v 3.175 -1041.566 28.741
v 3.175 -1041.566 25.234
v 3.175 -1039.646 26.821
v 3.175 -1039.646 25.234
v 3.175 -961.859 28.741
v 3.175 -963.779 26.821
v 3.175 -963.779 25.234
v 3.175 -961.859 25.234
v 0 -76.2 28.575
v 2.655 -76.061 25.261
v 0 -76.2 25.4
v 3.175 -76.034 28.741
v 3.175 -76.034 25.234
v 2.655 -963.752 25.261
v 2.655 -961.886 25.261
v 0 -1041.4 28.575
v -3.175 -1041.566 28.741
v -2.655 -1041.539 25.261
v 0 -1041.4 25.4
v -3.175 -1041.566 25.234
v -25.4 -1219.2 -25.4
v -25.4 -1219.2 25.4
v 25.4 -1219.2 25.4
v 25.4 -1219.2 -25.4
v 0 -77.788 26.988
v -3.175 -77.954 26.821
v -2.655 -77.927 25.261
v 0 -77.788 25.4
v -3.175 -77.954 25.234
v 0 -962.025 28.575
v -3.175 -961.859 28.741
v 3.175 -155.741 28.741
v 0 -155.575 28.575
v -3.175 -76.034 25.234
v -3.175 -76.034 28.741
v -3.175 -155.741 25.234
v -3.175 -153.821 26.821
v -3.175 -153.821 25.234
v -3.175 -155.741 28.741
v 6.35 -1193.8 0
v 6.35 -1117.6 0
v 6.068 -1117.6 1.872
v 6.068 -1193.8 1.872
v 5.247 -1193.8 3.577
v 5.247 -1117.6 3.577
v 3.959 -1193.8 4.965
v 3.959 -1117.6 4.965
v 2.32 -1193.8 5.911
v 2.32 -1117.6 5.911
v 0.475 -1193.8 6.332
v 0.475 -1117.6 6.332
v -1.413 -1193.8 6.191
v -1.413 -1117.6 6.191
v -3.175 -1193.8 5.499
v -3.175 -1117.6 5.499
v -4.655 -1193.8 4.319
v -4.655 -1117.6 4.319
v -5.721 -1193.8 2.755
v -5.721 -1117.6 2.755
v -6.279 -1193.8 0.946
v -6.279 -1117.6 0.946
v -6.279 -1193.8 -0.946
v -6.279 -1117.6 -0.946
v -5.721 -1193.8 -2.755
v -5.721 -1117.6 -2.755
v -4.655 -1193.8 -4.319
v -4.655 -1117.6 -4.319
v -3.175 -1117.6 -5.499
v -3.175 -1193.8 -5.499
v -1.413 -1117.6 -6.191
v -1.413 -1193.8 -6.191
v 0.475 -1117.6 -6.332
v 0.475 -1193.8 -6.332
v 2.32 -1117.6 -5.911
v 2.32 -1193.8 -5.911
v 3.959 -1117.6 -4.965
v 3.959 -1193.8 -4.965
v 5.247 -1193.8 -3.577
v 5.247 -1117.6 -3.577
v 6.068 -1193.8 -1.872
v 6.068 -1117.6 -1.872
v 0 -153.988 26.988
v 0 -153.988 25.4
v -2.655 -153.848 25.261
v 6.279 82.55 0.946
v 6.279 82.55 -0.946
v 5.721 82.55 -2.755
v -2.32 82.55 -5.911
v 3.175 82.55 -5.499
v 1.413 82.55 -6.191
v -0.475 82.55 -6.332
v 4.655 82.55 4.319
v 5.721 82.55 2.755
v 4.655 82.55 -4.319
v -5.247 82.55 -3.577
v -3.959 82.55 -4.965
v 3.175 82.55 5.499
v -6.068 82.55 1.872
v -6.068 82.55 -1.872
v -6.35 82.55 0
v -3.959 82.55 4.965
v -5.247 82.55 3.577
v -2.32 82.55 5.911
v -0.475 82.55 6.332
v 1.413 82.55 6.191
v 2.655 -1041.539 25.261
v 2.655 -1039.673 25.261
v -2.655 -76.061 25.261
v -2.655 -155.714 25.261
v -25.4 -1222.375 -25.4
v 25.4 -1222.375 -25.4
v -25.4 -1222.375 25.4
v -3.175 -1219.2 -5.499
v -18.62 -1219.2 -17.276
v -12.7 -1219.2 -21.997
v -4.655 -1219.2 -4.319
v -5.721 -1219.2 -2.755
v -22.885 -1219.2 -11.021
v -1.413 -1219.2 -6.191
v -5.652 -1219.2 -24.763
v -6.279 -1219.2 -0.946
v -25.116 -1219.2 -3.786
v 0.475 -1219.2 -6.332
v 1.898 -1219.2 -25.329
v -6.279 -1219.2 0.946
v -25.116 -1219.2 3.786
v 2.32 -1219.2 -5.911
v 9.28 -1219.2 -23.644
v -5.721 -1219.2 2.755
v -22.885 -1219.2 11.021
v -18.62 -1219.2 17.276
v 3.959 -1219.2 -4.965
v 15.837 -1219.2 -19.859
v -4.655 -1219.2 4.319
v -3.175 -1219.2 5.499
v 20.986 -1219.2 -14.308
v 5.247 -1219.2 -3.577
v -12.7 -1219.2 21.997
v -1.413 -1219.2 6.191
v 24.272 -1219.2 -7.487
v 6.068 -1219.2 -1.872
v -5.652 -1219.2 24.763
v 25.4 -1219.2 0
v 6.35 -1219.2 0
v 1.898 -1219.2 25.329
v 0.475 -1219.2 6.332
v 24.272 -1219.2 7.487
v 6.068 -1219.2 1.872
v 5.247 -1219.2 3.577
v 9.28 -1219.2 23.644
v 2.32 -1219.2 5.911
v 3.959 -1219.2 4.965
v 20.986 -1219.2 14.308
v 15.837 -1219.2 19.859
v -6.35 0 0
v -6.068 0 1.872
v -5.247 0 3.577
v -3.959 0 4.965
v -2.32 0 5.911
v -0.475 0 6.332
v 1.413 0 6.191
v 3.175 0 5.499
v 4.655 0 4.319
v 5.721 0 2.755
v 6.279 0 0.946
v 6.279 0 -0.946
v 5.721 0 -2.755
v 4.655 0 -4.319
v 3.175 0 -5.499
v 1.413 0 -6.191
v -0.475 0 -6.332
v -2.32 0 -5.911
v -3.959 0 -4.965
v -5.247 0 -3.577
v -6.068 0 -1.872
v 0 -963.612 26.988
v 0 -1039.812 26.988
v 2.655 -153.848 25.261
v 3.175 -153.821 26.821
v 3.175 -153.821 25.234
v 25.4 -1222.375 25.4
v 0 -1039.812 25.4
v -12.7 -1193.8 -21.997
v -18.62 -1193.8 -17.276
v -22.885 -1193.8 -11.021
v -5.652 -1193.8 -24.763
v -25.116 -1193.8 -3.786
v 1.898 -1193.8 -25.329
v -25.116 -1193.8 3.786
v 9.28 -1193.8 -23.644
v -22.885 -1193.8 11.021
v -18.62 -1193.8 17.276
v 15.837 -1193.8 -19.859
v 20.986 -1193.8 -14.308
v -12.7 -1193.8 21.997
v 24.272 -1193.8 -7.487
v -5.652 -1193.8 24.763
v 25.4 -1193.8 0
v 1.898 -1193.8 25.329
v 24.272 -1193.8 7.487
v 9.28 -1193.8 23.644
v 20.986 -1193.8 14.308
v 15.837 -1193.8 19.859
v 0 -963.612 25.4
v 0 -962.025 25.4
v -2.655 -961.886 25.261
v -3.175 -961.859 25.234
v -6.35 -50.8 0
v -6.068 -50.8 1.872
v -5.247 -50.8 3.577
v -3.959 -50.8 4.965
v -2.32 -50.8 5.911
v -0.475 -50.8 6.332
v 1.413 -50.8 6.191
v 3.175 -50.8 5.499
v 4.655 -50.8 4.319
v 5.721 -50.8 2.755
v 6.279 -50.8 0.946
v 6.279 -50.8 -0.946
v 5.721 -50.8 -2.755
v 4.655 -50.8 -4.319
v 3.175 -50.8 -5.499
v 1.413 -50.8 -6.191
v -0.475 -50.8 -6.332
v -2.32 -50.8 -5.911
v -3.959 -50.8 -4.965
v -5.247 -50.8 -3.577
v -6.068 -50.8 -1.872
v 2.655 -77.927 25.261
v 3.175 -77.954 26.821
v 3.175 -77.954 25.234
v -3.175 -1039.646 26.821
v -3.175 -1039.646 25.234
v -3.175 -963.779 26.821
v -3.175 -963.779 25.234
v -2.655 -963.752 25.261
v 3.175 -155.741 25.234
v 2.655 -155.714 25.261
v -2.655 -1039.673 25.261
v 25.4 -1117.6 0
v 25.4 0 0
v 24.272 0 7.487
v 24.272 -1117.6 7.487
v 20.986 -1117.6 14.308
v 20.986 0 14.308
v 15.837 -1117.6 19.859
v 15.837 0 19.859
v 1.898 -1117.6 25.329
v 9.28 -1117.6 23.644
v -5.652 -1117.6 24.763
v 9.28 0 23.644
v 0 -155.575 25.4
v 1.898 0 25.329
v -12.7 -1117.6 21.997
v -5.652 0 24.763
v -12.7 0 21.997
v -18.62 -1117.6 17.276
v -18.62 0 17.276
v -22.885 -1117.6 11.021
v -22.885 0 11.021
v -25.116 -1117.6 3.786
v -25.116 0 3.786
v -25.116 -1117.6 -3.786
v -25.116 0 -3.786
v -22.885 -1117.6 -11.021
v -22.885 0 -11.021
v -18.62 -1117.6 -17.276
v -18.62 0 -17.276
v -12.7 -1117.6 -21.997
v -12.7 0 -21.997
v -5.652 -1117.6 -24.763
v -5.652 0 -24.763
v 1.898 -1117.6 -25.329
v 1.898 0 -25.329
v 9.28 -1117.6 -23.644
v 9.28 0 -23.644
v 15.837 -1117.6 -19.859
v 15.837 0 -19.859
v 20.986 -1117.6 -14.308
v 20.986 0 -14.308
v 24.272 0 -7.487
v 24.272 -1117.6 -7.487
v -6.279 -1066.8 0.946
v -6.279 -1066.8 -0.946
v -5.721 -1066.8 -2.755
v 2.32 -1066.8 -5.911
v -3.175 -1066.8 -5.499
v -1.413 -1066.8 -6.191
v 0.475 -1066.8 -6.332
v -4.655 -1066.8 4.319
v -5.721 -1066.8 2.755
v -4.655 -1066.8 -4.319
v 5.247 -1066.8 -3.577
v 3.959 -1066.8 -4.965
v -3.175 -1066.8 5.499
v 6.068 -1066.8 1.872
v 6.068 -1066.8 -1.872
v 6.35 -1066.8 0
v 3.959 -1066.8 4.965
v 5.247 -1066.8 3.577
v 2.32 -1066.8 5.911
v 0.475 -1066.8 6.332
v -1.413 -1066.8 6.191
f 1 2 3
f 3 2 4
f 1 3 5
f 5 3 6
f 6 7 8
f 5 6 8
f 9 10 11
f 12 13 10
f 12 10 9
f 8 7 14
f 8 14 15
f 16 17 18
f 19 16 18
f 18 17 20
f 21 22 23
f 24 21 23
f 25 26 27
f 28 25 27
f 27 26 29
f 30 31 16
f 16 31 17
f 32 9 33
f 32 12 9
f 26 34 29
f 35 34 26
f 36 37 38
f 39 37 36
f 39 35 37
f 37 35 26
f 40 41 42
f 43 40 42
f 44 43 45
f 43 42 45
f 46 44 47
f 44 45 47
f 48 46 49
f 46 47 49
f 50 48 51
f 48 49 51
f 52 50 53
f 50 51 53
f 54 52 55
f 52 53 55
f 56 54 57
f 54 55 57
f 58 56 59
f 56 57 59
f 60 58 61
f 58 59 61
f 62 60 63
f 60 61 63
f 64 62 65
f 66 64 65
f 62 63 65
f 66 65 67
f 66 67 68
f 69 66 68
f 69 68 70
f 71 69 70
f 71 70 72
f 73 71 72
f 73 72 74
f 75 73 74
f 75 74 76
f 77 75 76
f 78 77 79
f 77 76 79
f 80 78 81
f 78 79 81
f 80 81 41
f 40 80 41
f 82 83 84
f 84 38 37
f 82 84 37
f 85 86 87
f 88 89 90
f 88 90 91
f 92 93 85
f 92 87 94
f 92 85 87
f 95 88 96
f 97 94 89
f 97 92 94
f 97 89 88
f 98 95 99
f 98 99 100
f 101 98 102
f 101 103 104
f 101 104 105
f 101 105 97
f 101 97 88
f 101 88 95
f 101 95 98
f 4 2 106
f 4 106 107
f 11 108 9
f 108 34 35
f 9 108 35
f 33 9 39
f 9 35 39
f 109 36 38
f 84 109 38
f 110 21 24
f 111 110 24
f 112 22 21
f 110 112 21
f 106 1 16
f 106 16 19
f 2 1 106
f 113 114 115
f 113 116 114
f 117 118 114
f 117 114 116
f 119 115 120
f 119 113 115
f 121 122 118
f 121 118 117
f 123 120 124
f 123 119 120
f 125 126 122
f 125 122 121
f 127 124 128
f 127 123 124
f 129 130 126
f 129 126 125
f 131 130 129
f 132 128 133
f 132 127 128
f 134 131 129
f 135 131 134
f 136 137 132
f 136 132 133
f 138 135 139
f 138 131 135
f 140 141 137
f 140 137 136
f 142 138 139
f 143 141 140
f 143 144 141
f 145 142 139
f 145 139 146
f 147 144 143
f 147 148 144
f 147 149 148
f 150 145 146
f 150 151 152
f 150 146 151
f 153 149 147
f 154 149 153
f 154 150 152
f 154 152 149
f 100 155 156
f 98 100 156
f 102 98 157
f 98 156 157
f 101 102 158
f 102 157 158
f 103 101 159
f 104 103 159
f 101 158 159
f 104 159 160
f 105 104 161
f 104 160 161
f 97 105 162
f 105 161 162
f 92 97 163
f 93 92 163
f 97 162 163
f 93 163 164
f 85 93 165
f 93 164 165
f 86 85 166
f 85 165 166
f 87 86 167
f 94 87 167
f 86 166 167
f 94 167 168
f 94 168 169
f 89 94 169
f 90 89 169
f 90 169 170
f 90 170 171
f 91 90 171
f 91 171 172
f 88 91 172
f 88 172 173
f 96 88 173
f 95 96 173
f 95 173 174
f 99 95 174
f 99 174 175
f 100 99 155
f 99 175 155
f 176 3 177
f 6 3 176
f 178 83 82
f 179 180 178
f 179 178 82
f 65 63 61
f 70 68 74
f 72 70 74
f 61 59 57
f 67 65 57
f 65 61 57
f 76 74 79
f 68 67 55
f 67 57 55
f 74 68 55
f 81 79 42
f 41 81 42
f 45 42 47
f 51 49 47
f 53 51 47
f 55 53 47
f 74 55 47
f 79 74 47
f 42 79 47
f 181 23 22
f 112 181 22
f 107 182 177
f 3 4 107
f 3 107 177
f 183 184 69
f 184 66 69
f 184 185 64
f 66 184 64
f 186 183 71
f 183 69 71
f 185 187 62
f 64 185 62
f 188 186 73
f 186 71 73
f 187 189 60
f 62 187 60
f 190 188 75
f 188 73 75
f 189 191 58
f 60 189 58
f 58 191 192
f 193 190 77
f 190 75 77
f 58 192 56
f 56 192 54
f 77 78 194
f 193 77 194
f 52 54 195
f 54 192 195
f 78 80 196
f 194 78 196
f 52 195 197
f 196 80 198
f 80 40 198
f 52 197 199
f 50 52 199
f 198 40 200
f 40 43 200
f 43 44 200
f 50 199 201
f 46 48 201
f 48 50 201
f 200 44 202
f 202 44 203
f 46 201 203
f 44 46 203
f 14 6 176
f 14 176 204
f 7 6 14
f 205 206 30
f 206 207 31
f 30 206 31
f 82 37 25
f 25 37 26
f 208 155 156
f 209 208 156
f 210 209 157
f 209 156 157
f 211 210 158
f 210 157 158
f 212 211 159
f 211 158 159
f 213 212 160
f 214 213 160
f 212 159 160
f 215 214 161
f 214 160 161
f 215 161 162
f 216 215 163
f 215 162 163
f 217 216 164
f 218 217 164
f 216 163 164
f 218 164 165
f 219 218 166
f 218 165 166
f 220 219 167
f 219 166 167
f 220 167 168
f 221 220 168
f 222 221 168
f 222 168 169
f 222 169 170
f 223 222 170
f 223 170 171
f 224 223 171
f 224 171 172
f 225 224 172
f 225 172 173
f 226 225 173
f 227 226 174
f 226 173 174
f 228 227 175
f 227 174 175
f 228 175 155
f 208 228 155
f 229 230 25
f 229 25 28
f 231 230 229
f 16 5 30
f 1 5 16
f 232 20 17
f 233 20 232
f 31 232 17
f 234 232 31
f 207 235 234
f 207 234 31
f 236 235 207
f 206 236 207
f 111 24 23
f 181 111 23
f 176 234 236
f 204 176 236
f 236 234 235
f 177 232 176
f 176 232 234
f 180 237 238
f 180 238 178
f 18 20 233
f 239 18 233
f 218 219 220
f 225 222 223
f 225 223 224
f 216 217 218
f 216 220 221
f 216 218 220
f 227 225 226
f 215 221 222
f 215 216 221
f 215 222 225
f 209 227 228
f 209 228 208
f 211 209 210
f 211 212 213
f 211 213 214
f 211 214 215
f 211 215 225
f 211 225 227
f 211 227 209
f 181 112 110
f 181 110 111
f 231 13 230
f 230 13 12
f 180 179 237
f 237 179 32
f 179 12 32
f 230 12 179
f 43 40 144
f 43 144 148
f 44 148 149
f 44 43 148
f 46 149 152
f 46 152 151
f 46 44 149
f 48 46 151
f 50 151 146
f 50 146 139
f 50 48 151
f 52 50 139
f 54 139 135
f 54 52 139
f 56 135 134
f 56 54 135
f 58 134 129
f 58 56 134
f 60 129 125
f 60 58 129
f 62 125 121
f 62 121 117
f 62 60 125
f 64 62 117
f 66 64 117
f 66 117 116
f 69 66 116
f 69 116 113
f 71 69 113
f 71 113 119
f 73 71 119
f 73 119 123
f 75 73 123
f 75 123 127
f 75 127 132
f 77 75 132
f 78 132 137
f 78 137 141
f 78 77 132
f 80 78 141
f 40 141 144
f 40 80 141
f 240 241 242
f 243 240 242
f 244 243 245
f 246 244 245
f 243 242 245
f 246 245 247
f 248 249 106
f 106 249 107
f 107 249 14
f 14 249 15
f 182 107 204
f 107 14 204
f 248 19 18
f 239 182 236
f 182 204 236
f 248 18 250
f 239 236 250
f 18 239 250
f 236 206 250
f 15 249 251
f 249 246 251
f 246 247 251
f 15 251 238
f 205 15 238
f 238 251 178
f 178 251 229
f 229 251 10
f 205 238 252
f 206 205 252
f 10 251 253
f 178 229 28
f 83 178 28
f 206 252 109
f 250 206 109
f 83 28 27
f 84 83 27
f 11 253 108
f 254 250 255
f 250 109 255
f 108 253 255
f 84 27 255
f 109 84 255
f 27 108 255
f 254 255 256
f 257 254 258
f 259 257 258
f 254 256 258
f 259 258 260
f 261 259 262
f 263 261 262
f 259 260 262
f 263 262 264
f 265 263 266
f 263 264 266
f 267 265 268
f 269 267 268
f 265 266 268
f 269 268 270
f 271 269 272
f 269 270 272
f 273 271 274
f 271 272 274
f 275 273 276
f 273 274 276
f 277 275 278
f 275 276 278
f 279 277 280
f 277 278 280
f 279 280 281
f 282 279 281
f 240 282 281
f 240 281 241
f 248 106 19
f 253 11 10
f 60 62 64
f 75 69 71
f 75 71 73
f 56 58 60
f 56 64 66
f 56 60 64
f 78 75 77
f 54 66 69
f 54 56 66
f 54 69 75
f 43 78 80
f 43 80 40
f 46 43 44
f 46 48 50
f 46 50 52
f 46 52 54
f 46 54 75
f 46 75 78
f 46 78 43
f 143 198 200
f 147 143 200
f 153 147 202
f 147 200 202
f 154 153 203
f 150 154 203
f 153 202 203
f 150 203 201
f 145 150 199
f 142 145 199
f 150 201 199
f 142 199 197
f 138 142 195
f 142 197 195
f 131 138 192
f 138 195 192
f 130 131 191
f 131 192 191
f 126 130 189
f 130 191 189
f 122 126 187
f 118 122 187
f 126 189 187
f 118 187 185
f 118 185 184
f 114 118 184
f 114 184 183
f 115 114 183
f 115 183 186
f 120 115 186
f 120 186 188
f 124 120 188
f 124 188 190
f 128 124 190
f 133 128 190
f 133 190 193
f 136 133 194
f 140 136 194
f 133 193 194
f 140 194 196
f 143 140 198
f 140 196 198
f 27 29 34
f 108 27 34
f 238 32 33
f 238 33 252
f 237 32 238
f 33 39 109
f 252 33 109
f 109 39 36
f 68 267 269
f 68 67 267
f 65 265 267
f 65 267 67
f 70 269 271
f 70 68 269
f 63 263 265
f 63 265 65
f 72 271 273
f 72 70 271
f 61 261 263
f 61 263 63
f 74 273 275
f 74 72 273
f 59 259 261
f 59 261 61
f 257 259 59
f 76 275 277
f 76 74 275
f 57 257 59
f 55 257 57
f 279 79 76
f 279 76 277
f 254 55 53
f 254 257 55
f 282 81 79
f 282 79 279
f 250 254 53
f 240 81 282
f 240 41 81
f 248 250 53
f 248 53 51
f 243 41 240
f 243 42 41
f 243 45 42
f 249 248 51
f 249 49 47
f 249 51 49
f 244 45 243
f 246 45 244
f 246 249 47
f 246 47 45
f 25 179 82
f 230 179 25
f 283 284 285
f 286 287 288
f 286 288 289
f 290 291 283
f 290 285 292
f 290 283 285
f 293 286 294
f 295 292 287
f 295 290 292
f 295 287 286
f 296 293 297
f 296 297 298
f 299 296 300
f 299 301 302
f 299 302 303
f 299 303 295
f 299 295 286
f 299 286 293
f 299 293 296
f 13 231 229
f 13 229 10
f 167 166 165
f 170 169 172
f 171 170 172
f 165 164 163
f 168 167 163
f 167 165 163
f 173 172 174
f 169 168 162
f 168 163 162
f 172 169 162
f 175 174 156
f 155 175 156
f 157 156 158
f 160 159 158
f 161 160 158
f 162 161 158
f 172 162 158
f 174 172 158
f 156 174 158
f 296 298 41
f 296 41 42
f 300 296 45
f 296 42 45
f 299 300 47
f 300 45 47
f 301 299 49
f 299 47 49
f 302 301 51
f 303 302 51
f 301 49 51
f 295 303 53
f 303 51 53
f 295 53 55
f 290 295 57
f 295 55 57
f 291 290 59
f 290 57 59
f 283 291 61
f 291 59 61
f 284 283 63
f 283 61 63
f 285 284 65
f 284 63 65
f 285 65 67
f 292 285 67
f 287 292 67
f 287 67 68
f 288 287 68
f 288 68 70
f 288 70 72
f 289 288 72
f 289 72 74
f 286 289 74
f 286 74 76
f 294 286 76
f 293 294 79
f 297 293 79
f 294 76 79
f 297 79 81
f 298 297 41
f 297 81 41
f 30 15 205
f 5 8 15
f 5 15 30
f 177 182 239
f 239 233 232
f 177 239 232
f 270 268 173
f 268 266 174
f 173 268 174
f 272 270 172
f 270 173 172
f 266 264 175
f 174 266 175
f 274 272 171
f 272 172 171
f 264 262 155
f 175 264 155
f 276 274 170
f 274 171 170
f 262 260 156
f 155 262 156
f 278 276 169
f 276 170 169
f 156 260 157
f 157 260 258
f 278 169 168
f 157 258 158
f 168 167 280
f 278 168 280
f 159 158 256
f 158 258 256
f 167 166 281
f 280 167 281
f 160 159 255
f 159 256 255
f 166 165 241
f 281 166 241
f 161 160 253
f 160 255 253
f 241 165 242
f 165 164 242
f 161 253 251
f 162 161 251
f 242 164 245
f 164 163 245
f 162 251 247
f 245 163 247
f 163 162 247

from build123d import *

# Parameters (mm, degrees)
F0_R      = 25.4
F1_DEPTH  = 1117.6
F2_R      = 6.35
F3_DEPTH  = 50.8
F4_R      = 6.35
F5_DEPTH  = 50.8
F6_DEPTH  = 76.2
F7_R      = 25.4
F7_R_2    = 6.35
F8_DEPTH  = 25.4
F9_DEPTH  = 82.55
F10_R     = 6.35
F11_DEPTH = 3.175
F13_DEPTH = 3.175
F13_TAPER = -3


with BuildPart() as f1:
    # F0 (on Front) → F1 (new body)
    with BuildSketch(Plane.XZ):
        Circle(F0_R)
    extrude(amount=F1_DEPTH)

    # F2 (on face) → F3 (cut)
    with BuildSketch(Plane(origin=(0, 0, 0), x_dir=(-1, 0, 0), z_dir=(0, 1, 0))):
        Circle(F2_R)
    extrude(amount=-F3_DEPTH, mode=Mode.SUBTRACT)

    # F4 (on face) → F5 (cut)
    with BuildSketch(Plane.XZ.offset(1117.6)):
        Circle(F4_R)
    extrude(amount=-F5_DEPTH, mode=Mode.SUBTRACT)

    # F12 (on Right) → F13 (join, symmetric)
    with BuildSketch(Plane.YZ):
        Polygon((-77.7875, 25.4), (-76.2, 25.4), (-76.2, 28.575), (-155.575, 28.575), (-155.575, 25.4), (-153.9875, 25.4), (-153.9875, 26.9875), (-77.7875, 26.9875), align=None)
        Polygon((-1041.4, 28.575), (-1041.4, 25.4), (-1039.8125, 25.4), (-1039.8125, 26.9875), (-963.6125, 26.9875), (-963.6125, 25.4), (-962.025, 25.4), (-962.025, 28.575), align=None)
    extrude(amount=F13_DEPTH, both=True, taper=F13_TAPER)


with BuildPart() as f6:
    # F4 (on face) → F6 (new body)
    with BuildSketch(Plane.XZ.offset(1117.6)):
        Circle(F4_R)
    extrude(amount=F6_DEPTH)


with BuildPart() as f8:
    # F7 (on face) → F8 (new body)
    with BuildSketch(Plane.XZ.offset(1193.8)):
        Circle(F7_R)
        Circle(F7_R_2, mode=Mode.SUBTRACT)
    extrude(amount=F8_DEPTH)


with BuildPart() as f9:
    # F2 (on face) → F9 (new body)
    with BuildSketch(Plane(origin=(0, 0, 0), x_dir=(-1, 0, 0), z_dir=(0, 1, 0))):
        Circle(F2_R)
    extrude(amount=F9_DEPTH)


with BuildPart() as f11:
    # F10 (on face) → F11 (new body)
    with BuildSketch(Plane.XZ.offset(1219.2)):
        with BuildLine():
            Line((4.89e-08, 25.4), (-25.4, 25.4))
            Line((-25.4, 25.4), (-25.4, 3.44e-08))
            ThreePointArc((-25.4, 3.44e-08), (-17.9605122127, 17.9605122716), (4.89e-08, 25.4))
        make_face()
        with BuildLine():
            Line((25.4, 25.4), (4.89e-08, 25.4))
            ThreePointArc((4.89e-08, 25.4), (17.9605122594, 17.9605122249), (25.4, 0))
            Line((25.4, 0), (25.4, 25.4))
        make_face()
        with BuildLine():
            ThreePointArc((25.4, 0), (17.9605122594, 17.9605122249), (4.89e-08, 25.4))
            ThreePointArc((4.89e-08, 25.4), (-17.9605122127, 17.9605122716), (-25.4, 3.44e-08))
            ThreePointArc((-25.4, 3.44e-08), (-17.9605122437, -17.9605122406), (3.01e-08, -25.4))
            ThreePointArc((3.01e-08, -25.4), (17.9605122528, -17.9605122315), (25.4, 0))
        make_face()
        Circle(F10_R, mode=Mode.SUBTRACT)
        Circle(F10_R)
        with BuildLine():
            ThreePointArc((3.01e-08, -25.4), (-17.9605122437, -17.9605122406), (-25.4, 3.44e-08))
            Line((-25.4, 3.44e-08), (-25.4, -25.4))
            Line((-25.4, -25.4), (3.01e-08, -25.4))
        make_face()
        with BuildLine():
            Line((25.4, -25.4), (25.4, 0))
            ThreePointArc((25.4, 0), (17.9605122528, -17.9605122315), (3.01e-08, -25.4))
            Line((3.01e-08, -25.4), (25.4, -25.4))
        make_face()
    extrude(amount=F11_DEPTH)


solid = Compound([f1.part, f6.part, f8.part, f9.part, f11.part])
